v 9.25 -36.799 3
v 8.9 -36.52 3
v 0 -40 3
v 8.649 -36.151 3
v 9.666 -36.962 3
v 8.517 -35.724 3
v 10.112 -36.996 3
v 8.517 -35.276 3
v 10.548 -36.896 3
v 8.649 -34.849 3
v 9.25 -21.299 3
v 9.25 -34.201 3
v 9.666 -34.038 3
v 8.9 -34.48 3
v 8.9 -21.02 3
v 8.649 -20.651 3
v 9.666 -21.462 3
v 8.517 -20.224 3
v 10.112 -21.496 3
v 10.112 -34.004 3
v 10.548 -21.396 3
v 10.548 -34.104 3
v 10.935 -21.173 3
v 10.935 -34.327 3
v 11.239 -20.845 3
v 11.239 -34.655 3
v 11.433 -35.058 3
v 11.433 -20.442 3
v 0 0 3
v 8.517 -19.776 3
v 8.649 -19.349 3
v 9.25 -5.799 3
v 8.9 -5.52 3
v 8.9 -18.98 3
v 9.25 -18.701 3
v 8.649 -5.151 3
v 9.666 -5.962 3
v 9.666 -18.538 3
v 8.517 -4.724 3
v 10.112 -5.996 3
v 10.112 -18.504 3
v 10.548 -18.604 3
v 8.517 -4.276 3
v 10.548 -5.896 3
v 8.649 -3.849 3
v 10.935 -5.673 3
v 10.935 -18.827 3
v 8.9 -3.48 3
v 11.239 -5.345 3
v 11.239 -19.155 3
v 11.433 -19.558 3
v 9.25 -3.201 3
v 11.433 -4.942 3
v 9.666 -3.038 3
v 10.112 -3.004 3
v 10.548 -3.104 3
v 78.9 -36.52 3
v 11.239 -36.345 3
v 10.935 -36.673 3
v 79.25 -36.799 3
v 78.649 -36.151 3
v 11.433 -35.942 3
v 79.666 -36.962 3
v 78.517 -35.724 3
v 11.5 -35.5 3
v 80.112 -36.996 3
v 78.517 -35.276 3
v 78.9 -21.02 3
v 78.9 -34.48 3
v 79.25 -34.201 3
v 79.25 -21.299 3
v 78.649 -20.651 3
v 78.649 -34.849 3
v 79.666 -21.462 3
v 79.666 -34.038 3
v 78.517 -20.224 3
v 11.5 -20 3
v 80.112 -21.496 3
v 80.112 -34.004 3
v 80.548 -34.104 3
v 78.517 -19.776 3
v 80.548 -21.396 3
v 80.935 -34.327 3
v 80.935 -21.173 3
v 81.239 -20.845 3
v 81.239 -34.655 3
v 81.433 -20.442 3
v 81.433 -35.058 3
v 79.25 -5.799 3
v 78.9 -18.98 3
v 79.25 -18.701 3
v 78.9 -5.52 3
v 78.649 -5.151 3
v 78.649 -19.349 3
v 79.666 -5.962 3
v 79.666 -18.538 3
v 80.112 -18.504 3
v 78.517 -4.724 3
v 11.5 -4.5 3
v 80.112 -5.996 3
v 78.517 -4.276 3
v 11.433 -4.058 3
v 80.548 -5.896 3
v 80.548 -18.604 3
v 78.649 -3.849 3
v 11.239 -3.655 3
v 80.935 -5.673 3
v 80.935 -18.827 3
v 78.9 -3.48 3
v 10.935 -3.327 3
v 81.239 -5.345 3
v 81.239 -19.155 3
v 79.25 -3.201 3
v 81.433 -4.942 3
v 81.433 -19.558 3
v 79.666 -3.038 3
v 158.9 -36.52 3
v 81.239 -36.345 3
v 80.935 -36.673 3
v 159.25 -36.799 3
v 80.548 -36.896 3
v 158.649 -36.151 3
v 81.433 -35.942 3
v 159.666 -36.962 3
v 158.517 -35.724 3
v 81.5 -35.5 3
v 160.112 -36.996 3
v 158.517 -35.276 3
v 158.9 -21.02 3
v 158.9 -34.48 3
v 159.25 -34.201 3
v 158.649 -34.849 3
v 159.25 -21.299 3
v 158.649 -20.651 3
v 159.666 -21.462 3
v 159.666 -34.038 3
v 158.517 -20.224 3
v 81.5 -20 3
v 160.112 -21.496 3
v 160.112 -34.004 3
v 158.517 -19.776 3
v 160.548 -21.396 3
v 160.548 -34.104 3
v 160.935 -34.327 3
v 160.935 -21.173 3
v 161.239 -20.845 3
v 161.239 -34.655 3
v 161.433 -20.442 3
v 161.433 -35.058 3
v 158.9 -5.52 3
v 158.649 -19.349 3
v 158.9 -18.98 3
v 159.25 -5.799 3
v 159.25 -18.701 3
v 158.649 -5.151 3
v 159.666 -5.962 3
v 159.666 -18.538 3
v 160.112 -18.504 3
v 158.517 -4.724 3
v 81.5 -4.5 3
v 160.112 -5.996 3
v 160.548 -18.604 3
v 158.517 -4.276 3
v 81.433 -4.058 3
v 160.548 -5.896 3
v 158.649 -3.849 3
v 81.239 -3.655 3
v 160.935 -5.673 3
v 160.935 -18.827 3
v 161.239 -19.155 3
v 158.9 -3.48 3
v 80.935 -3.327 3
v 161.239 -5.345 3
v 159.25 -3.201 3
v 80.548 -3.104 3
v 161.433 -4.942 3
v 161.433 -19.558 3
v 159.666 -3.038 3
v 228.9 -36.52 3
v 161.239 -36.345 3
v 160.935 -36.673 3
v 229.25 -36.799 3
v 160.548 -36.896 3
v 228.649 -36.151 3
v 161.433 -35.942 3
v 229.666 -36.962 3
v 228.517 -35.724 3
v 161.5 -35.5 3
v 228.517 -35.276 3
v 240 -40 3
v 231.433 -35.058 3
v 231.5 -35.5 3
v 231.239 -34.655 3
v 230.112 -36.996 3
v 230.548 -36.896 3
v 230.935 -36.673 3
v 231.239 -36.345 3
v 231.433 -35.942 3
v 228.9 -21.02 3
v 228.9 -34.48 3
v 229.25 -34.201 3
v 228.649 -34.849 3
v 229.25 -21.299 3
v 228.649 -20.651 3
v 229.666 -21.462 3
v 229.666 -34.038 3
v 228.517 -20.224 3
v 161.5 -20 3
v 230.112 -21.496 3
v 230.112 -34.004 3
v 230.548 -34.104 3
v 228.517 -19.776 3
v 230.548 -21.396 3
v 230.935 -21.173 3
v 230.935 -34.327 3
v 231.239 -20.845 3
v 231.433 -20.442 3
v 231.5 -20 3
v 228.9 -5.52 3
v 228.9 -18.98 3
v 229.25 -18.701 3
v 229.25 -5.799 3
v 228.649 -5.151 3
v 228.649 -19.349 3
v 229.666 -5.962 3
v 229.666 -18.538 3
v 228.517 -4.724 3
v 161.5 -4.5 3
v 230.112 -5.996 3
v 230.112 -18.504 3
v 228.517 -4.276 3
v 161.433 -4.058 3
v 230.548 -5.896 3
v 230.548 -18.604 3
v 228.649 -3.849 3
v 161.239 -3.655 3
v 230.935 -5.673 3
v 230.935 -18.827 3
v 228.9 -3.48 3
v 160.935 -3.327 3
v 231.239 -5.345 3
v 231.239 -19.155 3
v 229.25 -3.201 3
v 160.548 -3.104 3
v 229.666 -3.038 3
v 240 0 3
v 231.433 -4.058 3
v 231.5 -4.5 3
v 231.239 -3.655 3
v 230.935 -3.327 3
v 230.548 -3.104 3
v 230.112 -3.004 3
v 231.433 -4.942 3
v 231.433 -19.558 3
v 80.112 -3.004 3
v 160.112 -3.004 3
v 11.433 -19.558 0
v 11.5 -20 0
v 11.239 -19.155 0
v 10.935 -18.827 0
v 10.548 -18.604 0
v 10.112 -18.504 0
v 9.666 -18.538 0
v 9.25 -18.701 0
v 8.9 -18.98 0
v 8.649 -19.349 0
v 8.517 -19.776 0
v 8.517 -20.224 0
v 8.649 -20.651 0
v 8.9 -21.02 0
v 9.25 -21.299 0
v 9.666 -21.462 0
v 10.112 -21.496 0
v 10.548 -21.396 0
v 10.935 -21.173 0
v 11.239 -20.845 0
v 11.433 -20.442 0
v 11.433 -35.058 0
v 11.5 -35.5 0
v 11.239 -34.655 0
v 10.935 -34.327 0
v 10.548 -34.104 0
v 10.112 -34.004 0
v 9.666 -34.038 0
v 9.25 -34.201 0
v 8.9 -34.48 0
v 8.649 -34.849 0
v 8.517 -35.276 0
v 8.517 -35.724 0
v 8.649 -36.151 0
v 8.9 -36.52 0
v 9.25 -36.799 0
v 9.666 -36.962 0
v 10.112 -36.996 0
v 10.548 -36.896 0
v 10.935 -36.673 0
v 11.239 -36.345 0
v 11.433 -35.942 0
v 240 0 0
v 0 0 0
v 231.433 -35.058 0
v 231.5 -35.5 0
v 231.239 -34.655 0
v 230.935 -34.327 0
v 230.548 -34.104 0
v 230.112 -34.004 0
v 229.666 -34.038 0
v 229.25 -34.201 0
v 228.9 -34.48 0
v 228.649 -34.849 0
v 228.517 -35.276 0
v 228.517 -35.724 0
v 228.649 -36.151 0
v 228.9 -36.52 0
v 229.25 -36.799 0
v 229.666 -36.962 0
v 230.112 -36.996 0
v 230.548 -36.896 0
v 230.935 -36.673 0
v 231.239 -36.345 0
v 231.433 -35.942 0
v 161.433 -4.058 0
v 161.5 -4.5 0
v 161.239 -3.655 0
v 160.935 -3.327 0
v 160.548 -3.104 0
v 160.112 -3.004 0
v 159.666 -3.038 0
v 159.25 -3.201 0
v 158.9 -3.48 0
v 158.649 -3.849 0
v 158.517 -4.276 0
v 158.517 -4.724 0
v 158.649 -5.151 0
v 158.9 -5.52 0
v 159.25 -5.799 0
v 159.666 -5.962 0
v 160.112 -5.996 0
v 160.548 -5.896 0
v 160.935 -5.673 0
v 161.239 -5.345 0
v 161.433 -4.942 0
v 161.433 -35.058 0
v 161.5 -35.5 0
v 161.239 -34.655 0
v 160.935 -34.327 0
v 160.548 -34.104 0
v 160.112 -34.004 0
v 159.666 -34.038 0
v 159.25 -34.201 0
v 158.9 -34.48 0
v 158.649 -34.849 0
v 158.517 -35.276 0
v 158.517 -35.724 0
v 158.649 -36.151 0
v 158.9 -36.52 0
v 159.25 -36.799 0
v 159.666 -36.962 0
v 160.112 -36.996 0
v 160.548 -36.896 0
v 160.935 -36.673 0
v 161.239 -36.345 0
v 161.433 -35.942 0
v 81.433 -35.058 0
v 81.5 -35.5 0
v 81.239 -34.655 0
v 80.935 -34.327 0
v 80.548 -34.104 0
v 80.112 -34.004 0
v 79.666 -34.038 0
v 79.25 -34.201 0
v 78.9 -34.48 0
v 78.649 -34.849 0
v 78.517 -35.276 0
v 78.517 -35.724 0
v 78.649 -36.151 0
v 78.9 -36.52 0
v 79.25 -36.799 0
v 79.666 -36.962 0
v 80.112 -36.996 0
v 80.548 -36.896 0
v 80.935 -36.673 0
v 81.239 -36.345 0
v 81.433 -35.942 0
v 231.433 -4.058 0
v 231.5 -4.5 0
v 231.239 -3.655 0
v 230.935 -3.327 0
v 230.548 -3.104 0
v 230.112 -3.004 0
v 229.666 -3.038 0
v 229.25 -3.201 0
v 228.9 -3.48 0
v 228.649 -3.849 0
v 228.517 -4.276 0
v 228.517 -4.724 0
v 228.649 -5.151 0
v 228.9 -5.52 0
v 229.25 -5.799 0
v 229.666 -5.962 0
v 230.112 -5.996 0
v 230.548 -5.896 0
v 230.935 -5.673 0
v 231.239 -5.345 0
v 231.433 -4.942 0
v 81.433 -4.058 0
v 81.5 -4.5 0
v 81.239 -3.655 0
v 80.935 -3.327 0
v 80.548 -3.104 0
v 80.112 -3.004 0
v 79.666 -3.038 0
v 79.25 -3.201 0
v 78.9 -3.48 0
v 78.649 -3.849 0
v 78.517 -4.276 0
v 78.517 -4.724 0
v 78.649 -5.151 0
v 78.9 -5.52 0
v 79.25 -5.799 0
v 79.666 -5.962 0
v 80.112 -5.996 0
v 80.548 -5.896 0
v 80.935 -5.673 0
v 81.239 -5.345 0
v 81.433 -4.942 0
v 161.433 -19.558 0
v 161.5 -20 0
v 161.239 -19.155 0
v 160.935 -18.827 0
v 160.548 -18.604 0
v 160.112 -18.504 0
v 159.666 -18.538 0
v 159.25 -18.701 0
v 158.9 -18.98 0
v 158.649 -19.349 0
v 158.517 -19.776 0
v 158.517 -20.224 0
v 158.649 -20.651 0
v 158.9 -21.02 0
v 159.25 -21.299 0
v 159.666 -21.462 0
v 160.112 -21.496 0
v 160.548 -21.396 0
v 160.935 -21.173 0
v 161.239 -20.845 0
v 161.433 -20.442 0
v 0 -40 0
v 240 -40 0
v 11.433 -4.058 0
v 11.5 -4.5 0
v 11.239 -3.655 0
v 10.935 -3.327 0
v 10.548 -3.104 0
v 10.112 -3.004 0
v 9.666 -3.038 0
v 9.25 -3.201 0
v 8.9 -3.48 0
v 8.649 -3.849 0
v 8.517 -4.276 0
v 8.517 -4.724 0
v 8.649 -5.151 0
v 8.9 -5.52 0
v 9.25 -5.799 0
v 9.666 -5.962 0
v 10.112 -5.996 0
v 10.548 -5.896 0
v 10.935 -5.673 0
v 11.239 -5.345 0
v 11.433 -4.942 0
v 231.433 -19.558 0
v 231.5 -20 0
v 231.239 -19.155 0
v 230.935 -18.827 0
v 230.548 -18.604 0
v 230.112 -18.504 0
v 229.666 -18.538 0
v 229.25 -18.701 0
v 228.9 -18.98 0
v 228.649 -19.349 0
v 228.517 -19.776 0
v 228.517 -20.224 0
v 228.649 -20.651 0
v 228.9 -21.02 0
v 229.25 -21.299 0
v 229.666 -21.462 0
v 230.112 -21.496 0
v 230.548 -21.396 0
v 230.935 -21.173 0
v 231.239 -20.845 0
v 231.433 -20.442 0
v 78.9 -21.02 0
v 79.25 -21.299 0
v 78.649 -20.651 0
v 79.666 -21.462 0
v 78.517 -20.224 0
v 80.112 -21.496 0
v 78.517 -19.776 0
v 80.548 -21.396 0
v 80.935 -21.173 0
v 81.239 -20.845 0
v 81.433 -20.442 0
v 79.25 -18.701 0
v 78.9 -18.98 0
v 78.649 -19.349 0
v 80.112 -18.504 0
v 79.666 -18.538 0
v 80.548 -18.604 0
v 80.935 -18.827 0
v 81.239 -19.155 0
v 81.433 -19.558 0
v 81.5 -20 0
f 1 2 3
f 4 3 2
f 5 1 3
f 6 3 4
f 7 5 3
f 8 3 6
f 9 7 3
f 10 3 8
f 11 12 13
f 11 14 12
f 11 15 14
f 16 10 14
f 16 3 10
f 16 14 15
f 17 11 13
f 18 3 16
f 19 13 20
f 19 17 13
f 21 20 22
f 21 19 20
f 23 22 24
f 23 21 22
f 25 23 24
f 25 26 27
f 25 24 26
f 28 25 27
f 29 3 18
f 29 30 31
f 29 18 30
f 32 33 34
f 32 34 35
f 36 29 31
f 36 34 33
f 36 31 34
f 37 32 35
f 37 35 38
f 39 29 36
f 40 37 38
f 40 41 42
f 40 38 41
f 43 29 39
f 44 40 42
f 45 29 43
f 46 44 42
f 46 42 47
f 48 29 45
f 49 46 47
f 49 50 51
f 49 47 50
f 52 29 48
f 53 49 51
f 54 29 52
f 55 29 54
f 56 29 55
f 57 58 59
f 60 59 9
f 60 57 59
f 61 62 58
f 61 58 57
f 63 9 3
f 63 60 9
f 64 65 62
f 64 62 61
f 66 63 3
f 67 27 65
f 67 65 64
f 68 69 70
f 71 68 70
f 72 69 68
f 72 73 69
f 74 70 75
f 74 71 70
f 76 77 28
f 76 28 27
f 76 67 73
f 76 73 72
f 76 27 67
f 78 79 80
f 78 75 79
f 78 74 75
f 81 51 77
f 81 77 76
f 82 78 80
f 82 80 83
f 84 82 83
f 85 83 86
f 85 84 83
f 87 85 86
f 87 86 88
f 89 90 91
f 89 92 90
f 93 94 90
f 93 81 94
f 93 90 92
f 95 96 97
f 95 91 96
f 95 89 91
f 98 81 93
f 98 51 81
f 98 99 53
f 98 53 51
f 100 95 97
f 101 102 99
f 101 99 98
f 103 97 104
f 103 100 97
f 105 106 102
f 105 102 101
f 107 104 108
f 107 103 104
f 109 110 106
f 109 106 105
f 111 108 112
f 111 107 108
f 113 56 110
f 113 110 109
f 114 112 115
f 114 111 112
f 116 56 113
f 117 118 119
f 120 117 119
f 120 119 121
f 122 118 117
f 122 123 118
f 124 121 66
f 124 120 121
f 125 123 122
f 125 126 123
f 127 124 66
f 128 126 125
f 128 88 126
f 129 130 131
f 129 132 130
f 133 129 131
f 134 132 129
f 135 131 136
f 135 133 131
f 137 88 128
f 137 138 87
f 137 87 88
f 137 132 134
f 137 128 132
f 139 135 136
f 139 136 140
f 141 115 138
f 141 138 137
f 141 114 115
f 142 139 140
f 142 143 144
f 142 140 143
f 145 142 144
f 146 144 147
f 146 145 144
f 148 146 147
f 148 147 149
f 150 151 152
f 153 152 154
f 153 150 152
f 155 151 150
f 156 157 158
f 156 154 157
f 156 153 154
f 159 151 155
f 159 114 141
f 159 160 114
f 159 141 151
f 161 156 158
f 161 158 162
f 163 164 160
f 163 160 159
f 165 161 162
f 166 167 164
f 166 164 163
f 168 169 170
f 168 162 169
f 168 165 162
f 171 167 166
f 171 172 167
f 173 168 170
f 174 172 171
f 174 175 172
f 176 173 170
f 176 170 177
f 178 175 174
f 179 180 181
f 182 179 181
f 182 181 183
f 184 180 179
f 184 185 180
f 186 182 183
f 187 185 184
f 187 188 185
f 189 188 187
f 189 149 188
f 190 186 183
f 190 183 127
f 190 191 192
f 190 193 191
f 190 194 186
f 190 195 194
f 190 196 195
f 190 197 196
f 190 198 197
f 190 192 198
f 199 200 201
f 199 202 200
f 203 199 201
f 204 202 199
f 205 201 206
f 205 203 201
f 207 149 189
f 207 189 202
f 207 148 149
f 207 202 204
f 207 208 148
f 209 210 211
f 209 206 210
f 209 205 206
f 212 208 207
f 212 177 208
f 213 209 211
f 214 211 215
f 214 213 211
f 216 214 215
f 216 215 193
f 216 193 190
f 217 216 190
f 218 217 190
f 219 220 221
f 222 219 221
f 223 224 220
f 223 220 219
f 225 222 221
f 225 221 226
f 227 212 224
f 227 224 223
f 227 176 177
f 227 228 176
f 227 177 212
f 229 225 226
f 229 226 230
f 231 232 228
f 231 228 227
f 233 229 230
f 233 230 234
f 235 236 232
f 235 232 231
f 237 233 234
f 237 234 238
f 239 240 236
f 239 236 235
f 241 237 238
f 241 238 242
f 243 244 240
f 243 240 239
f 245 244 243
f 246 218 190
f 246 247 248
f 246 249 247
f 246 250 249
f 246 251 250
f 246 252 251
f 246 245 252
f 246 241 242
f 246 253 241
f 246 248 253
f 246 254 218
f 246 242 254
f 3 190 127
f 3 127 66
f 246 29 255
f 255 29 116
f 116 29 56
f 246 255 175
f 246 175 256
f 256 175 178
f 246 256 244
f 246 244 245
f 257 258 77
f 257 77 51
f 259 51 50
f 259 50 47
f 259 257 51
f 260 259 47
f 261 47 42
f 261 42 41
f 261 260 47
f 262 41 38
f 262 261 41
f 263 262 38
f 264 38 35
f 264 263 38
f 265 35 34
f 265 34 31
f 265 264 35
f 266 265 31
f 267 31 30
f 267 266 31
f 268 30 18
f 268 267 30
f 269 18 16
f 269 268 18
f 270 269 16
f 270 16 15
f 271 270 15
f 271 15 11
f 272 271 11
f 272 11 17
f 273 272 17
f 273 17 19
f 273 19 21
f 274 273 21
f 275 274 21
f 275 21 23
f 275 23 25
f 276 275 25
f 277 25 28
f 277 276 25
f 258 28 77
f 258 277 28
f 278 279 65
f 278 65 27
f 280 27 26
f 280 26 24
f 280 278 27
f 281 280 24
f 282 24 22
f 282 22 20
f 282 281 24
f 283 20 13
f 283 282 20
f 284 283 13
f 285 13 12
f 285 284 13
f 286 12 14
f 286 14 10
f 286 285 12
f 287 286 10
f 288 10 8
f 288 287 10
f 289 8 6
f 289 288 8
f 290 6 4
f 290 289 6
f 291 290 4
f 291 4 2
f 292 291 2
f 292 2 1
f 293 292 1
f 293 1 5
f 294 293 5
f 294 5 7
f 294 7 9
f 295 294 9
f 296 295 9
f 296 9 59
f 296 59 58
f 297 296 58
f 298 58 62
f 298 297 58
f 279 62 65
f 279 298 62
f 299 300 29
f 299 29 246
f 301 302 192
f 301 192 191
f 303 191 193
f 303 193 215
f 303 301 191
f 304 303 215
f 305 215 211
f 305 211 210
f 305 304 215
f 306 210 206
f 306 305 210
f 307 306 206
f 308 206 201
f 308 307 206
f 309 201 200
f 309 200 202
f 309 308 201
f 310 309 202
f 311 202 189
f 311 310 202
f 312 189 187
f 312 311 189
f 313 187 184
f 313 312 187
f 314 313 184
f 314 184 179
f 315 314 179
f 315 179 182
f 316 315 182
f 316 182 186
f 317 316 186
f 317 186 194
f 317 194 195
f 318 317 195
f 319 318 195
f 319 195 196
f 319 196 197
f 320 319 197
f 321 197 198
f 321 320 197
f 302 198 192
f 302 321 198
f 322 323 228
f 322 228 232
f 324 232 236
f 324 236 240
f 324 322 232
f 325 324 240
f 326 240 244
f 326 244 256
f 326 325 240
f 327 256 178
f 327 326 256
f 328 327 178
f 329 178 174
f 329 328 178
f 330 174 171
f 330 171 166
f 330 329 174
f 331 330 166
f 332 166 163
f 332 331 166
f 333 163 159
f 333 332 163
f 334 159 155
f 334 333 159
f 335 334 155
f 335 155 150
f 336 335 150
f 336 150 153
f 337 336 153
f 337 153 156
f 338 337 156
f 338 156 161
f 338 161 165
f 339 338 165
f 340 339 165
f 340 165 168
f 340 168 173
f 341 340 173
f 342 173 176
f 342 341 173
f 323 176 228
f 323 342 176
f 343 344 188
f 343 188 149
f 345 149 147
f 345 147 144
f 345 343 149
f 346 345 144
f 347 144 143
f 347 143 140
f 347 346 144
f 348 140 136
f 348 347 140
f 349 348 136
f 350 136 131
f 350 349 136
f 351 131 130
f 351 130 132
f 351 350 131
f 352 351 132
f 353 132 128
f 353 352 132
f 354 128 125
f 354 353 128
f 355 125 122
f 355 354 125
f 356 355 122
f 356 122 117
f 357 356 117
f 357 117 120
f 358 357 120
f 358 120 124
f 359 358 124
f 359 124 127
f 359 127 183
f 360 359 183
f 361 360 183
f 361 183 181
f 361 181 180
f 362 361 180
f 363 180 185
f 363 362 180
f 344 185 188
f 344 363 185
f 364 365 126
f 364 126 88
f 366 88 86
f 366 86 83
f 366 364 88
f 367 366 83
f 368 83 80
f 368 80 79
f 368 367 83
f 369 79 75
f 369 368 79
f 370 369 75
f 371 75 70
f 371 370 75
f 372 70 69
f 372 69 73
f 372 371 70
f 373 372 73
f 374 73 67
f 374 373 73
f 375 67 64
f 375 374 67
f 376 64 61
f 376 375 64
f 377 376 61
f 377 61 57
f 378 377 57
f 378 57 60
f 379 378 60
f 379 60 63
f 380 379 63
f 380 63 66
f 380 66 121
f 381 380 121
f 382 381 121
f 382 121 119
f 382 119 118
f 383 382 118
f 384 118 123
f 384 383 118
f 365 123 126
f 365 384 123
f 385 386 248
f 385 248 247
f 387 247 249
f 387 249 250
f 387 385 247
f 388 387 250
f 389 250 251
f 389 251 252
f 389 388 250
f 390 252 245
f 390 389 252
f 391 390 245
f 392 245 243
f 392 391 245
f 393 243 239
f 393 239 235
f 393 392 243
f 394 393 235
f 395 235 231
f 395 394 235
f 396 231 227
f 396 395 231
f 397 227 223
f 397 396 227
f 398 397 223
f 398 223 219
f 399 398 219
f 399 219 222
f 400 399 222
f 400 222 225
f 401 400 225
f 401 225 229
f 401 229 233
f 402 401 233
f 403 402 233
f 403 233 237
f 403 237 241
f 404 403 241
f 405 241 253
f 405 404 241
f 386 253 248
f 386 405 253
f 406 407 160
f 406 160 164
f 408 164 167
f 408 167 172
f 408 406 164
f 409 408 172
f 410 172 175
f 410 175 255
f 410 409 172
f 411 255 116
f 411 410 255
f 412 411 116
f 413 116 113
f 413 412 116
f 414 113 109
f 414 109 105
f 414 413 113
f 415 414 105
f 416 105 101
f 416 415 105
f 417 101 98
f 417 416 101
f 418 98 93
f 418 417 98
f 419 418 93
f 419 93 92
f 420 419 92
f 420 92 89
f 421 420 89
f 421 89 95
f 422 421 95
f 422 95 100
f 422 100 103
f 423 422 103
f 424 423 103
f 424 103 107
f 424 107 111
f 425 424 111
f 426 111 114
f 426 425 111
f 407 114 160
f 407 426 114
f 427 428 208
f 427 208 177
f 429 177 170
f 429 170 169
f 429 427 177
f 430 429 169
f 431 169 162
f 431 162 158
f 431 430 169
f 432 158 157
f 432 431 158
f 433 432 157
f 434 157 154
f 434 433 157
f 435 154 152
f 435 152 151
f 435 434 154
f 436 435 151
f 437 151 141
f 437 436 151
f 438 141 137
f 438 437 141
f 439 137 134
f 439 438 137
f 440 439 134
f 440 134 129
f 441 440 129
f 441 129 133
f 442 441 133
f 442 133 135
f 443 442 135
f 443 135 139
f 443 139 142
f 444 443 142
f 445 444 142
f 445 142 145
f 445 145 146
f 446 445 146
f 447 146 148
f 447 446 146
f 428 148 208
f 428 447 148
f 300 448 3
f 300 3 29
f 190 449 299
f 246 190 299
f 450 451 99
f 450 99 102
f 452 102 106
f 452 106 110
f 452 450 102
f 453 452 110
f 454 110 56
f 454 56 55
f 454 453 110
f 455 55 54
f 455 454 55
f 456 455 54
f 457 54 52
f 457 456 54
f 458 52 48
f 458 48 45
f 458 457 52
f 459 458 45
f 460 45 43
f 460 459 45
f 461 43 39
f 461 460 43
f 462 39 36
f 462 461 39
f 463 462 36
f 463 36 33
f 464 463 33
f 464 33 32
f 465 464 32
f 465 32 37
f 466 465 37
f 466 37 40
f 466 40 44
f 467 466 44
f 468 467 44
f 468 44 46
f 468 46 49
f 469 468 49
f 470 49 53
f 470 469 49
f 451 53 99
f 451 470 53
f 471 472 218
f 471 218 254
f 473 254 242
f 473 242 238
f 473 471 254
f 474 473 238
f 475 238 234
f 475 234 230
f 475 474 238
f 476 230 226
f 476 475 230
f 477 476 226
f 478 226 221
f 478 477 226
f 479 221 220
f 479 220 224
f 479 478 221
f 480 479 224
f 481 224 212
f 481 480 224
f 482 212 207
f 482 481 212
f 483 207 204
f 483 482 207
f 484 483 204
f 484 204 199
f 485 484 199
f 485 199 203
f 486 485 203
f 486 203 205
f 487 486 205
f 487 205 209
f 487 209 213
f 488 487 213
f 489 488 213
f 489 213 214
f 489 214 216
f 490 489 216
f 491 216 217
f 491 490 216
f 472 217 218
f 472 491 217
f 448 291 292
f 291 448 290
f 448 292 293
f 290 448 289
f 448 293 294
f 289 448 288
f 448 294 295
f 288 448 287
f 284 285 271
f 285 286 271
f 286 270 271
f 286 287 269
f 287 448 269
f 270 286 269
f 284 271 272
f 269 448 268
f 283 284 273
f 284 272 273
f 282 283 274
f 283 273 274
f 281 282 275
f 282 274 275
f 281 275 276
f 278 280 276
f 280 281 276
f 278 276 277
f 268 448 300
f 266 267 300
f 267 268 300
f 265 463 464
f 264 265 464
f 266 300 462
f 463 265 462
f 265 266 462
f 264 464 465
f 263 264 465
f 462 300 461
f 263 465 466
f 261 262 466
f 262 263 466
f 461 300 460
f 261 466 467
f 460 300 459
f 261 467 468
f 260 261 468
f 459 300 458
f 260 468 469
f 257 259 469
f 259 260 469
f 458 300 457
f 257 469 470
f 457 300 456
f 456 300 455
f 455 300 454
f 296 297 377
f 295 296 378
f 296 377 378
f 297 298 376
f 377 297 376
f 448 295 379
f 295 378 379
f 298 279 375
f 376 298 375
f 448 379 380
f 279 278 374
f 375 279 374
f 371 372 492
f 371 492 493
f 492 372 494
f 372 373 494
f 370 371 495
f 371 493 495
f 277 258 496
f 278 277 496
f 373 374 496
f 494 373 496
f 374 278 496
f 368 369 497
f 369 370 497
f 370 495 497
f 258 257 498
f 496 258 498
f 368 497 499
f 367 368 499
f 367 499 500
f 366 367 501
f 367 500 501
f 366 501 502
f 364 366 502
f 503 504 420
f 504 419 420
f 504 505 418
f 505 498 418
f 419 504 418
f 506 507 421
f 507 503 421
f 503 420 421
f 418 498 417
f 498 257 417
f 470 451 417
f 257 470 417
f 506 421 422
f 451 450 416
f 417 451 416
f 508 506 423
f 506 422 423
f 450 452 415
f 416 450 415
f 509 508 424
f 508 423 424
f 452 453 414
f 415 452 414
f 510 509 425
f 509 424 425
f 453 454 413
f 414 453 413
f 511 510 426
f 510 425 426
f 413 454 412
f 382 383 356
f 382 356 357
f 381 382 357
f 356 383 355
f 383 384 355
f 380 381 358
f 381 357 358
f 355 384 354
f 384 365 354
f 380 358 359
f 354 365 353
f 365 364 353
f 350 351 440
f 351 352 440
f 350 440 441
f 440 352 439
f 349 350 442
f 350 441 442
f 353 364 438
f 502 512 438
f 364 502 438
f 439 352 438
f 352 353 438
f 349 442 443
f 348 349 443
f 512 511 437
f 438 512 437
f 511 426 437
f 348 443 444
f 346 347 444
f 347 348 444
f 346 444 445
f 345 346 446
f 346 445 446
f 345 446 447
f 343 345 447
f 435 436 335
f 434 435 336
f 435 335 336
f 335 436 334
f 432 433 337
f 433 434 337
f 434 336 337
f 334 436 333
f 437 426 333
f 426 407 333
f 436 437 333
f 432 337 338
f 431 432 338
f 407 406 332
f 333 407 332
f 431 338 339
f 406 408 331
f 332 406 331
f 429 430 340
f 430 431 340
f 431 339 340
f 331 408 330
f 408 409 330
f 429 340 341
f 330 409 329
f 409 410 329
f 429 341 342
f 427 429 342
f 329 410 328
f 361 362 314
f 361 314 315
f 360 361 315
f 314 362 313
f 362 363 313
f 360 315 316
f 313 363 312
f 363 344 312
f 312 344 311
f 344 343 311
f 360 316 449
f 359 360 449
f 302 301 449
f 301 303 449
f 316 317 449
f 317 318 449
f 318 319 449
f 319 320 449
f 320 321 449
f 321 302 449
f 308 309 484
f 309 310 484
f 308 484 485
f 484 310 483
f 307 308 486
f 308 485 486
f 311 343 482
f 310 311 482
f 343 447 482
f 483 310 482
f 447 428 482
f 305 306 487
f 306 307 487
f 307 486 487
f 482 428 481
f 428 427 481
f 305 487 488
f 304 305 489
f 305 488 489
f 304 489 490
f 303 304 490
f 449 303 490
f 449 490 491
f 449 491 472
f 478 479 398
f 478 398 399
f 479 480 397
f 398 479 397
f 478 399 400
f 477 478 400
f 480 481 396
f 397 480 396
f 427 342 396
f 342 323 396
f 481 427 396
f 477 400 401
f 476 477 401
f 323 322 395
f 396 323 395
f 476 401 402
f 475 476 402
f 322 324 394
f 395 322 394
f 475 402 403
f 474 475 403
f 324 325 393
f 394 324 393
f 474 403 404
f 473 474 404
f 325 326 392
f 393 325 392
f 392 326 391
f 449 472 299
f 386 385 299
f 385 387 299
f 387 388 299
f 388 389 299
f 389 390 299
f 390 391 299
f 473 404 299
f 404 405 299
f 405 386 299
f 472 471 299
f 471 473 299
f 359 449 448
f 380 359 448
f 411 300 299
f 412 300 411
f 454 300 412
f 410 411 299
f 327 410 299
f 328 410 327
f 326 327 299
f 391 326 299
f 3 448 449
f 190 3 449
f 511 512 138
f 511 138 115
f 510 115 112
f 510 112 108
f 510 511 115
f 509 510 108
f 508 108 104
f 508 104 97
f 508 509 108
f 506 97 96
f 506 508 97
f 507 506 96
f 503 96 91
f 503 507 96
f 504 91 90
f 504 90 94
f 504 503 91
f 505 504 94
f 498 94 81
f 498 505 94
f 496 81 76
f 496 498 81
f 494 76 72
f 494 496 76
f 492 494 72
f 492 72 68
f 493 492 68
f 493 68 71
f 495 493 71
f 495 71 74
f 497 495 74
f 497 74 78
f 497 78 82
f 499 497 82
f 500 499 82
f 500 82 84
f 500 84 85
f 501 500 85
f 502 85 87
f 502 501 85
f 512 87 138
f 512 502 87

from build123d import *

# Parameters (mm, degrees)
SKETCH_W  = 240
SKETCH_H  = 40
SKETCH_R  = 1.5
PAD_DEPTH = 3


with BuildPart() as part:
    # Sketch → Pad (new body)
    with BuildSketch(Plane.XY):
        with Locations((120, -20)):
            Rectangle(SKETCH_W, SKETCH_H)
        with Locations((10, -4.5)):
            Circle(SKETCH_R, mode=Mode.SUBTRACT)
        with Locations((10, -20)):
            Circle(SKETCH_R, mode=Mode.SUBTRACT)
        with Locations((10, -35.5)):
            Circle(SKETCH_R, mode=Mode.SUBTRACT)
        with Locations((80, -4.5)):
            Circle(SKETCH_R, mode=Mode.SUBTRACT)
        with Locations((80, -20)):
            Circle(SKETCH_R, mode=Mode.SUBTRACT)
        with Locations((80, -35.5)):
            Circle(SKETCH_R, mode=Mode.SUBTRACT)
        with Locations((160, -4.5)):
            Circle(SKETCH_R, mode=Mode.SUBTRACT)
        with Locations((160, -20)):
            Circle(SKETCH_R, mode=Mode.SUBTRACT)
        with Locations((160, -35.5)):
            Circle(SKETCH_R, mode=Mode.SUBTRACT)
        with Locations((230, -4.5)):
            Circle(SKETCH_R, mode=Mode.SUBTRACT)
        with Locations((230, -20)):
            Circle(SKETCH_R, mode=Mode.SUBTRACT)
        with Locations((230, -35.5)):
            Circle(SKETCH_R, mode=Mode.SUBTRACT)
    extrude(amount=PAD_DEPTH)


solid = part.part
